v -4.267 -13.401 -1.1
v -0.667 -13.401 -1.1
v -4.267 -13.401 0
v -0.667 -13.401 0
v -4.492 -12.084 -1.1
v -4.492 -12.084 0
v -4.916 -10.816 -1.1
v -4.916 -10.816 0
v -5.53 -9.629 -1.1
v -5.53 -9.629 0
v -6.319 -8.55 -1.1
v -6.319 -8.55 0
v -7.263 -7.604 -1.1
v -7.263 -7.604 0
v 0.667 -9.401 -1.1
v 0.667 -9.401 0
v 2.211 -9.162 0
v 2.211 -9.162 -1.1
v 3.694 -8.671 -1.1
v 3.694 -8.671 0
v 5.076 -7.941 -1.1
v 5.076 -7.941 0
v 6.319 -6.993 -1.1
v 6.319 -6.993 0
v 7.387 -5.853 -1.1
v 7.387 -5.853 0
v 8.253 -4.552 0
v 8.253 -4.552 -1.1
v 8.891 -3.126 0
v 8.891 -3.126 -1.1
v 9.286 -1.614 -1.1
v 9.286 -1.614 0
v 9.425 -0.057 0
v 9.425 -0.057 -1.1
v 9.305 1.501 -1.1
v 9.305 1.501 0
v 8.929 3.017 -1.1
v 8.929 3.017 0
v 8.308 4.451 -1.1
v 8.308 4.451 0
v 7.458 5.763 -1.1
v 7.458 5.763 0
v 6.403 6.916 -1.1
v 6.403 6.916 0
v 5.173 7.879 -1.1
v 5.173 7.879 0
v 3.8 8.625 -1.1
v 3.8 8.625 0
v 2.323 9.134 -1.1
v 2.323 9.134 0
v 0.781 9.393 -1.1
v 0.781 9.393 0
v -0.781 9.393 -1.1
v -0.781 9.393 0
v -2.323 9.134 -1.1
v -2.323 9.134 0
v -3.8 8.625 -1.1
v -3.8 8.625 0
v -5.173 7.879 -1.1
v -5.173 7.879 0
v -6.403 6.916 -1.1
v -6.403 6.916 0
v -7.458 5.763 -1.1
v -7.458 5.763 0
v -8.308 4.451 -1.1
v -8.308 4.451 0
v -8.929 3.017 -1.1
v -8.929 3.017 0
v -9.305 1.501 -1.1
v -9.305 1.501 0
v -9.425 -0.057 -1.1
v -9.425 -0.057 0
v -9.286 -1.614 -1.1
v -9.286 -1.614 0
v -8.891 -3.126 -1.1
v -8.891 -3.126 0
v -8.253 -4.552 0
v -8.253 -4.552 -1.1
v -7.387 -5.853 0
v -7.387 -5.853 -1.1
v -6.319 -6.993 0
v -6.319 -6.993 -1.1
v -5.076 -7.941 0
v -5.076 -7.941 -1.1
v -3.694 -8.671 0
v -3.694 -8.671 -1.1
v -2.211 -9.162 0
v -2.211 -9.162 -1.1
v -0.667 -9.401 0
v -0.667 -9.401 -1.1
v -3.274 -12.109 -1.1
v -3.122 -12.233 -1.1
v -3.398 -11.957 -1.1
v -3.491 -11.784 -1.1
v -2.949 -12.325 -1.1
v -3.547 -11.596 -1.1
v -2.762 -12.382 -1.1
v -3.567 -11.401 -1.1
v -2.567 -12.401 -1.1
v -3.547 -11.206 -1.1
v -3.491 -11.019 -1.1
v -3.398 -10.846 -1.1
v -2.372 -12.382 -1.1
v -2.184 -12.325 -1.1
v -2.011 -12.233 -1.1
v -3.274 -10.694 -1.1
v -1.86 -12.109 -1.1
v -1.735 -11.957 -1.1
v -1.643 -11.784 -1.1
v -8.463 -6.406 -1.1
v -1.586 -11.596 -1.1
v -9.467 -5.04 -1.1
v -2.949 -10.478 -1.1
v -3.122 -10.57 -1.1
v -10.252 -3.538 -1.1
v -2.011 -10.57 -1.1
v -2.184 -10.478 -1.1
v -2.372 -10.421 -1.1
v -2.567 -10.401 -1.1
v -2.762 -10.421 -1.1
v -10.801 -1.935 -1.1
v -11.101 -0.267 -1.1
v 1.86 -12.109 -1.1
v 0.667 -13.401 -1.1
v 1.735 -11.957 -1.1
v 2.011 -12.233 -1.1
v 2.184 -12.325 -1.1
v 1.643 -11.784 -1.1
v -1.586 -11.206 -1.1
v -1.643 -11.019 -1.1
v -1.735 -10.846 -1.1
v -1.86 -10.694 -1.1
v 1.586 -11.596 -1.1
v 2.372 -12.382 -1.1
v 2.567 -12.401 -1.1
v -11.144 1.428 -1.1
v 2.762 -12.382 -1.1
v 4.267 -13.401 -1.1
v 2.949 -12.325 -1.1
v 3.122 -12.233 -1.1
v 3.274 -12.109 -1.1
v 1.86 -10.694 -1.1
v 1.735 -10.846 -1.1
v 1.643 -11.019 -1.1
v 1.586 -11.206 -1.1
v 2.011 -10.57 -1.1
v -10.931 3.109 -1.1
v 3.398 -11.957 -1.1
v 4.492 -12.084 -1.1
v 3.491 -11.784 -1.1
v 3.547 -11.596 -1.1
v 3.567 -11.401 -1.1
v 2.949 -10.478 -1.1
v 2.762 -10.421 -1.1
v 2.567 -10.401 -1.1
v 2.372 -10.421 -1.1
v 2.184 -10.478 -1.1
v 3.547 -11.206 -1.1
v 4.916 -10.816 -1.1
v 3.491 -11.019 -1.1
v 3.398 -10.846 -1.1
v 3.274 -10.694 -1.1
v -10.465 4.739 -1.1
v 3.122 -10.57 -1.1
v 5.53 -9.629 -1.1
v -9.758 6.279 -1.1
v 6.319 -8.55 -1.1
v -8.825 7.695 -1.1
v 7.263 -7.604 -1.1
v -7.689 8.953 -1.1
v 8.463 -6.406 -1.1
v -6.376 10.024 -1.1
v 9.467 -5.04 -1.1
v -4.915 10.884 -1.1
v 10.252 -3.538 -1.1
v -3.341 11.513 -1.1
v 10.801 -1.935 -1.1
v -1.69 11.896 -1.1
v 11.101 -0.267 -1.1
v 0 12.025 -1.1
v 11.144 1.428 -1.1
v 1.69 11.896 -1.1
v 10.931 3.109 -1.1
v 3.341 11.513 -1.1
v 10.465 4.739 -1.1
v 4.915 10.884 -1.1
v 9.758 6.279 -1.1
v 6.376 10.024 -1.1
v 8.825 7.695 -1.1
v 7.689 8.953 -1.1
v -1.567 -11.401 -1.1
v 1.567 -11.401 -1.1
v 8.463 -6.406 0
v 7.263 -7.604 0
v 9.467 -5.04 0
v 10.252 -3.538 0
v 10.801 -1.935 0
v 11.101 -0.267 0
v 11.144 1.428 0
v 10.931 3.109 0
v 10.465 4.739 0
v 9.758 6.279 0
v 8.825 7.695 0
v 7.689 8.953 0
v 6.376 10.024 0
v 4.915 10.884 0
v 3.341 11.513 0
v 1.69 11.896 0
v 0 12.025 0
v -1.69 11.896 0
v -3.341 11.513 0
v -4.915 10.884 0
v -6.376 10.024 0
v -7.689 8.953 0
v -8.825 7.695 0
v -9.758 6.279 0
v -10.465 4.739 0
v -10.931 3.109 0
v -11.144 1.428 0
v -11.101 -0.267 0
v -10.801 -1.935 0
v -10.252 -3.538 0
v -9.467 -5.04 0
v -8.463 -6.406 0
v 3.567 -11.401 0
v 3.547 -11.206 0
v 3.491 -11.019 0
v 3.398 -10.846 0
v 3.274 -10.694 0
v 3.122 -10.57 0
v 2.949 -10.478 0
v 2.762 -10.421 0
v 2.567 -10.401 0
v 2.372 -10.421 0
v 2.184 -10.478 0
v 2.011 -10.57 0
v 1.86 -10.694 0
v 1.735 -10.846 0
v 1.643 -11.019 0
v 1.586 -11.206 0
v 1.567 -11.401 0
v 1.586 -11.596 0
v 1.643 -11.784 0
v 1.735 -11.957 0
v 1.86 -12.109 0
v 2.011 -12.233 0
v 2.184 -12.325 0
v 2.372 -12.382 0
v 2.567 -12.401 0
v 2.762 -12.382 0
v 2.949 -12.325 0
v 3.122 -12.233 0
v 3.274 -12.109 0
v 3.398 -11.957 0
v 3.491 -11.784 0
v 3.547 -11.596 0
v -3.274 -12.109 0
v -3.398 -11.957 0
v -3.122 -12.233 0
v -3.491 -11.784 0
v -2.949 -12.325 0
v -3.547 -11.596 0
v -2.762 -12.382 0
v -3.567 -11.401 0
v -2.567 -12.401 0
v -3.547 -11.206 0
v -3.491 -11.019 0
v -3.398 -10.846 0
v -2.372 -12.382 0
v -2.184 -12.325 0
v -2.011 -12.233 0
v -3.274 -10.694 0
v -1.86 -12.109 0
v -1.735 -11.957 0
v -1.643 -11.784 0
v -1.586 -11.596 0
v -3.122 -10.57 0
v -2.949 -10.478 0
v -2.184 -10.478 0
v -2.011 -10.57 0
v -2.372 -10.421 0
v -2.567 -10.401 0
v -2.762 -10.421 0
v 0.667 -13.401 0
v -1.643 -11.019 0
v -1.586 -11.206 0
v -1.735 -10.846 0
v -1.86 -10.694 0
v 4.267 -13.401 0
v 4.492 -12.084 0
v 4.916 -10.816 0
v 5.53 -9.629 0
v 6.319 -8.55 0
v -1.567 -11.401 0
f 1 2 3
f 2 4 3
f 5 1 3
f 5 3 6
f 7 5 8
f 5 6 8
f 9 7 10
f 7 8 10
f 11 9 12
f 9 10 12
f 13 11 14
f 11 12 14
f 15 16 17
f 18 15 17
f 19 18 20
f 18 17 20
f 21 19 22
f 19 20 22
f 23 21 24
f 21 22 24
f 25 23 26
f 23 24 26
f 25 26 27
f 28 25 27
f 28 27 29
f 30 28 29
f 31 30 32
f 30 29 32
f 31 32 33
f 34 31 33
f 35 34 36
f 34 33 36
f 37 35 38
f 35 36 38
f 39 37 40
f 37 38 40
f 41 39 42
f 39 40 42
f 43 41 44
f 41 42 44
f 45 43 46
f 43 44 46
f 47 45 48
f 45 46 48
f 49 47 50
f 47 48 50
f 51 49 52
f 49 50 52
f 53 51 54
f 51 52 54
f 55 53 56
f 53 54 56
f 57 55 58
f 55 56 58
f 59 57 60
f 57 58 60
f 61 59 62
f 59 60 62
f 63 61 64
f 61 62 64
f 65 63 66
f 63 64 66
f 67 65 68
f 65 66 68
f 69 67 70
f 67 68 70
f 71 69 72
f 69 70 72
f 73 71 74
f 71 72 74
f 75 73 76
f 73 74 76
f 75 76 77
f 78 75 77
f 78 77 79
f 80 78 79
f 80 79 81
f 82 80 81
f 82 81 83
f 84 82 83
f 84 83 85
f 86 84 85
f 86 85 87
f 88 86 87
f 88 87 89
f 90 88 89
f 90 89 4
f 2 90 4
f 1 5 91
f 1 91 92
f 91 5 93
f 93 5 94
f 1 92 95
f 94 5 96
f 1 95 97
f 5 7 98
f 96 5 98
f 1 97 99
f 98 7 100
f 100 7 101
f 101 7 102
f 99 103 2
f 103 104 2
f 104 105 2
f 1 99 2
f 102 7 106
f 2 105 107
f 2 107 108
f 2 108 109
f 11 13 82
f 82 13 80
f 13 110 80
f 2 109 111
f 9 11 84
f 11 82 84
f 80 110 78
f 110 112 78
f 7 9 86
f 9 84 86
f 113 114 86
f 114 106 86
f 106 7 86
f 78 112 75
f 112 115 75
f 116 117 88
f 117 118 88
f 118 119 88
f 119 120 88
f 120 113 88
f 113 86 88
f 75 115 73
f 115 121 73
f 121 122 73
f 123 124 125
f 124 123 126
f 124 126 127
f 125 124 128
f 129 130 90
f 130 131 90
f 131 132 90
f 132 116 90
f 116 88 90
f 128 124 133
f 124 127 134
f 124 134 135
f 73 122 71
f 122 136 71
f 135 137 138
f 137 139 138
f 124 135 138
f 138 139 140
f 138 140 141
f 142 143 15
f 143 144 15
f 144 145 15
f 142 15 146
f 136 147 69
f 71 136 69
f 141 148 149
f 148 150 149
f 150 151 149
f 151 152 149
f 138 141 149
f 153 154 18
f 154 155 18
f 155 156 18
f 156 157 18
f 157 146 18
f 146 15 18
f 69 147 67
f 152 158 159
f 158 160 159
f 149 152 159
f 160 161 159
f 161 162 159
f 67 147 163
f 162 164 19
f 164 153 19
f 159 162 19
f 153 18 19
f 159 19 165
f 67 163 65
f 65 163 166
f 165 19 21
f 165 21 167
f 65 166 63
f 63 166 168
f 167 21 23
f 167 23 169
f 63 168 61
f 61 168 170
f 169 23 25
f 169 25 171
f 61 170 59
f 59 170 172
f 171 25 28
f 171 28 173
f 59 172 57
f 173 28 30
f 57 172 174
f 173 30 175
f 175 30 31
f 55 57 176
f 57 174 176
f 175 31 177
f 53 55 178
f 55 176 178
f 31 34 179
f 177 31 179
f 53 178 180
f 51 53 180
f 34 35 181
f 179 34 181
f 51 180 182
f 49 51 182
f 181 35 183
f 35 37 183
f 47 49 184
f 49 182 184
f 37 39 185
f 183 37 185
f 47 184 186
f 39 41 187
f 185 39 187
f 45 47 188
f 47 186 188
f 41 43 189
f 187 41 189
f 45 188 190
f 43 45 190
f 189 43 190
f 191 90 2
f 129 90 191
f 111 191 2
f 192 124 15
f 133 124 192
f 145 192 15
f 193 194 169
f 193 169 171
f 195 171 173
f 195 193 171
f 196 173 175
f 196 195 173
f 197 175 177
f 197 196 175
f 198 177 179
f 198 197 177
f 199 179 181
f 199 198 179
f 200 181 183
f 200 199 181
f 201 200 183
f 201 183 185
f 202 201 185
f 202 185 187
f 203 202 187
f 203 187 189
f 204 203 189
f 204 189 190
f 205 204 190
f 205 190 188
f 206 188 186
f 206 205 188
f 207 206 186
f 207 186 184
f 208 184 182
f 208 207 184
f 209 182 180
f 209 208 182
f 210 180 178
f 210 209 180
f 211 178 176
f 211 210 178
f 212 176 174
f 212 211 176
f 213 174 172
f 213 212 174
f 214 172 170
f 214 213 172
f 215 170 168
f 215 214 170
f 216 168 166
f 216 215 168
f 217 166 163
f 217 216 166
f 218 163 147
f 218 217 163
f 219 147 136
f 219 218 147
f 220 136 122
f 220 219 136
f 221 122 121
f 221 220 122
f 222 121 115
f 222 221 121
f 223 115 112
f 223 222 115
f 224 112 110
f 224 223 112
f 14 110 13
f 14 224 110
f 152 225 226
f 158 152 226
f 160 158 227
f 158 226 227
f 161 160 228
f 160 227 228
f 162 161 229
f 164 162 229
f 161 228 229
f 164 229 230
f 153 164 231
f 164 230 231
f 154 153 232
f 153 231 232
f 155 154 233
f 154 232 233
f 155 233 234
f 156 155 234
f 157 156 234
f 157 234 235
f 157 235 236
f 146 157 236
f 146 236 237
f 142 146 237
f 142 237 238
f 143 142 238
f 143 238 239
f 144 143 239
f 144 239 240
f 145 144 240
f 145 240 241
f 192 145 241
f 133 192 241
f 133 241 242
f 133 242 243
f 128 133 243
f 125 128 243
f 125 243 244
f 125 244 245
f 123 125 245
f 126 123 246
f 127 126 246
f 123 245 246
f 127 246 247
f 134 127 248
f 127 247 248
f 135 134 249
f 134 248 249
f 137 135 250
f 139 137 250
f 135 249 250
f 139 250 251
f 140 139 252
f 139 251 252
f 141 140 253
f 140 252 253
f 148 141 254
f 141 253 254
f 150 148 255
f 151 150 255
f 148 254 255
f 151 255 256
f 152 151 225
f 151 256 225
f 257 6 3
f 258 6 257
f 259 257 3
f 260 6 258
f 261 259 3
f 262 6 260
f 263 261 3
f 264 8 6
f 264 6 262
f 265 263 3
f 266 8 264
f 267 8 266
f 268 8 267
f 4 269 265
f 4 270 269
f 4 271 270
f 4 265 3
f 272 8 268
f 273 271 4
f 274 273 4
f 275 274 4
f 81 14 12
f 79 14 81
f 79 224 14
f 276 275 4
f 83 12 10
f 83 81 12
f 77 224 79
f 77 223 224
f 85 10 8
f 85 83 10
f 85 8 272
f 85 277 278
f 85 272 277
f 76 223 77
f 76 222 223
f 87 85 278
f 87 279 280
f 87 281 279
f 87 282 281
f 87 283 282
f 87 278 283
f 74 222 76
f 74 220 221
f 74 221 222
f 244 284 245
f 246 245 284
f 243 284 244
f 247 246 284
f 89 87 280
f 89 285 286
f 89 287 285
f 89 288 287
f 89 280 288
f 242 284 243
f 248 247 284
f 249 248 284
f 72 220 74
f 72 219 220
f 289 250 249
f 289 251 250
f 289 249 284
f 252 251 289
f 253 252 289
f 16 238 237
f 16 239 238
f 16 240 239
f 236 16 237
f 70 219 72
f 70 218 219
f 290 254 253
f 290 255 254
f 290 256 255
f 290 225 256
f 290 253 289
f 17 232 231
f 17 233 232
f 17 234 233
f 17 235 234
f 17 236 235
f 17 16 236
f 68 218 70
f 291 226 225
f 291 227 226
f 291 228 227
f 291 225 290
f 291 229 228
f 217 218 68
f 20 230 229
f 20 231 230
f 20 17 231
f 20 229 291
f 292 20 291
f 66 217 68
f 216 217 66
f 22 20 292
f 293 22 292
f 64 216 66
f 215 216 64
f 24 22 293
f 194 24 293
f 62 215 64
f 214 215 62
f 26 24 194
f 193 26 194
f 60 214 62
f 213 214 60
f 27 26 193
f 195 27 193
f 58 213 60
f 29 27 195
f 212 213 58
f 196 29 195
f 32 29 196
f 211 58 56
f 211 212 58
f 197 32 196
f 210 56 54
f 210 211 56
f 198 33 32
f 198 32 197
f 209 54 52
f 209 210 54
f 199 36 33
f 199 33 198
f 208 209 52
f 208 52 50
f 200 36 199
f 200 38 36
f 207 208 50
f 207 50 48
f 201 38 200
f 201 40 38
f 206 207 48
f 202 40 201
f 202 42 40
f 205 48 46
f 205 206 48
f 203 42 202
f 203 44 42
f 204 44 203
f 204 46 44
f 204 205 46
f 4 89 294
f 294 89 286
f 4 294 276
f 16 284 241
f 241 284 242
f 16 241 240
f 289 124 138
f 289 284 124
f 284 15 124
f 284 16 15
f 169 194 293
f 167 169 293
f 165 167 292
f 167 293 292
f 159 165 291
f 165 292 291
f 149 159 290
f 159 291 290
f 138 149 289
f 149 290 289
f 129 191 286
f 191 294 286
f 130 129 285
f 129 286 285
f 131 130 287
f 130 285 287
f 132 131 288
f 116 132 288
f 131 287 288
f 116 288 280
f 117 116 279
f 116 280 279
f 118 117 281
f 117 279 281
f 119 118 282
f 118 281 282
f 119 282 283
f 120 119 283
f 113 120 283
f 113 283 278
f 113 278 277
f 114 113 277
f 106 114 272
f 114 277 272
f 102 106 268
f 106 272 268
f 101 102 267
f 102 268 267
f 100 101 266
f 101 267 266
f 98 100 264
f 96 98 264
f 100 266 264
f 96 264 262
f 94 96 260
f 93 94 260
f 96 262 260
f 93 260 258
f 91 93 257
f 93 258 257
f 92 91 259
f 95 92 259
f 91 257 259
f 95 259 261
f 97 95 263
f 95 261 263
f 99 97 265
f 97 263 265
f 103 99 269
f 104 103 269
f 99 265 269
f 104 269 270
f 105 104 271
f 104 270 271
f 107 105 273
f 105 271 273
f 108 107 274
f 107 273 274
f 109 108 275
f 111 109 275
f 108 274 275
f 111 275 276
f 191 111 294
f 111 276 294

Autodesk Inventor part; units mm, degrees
ref_plane "YZ Plane" through (0, 0, 0) normal (1, 0, 0) x (0, 1, 0)
ref_plane "XZ Plane" through (0, 0, 0) normal (0, 1, 0) x (-1, 0, 0)
ref_plane "XY Plane" through (0, 0, 0) normal (0, 0, 1) x (1, 0, 0)
sketch "草图2" plane through (0, 0, 0) normal (0, 0, 1) x (1, 0, 0)
  line L0 (-0.6667, -13.4014) -> (-4.2667, -13.4014)
  line L1 (-0.6667, -9.4014) -> (-0.6667, -13.4014)
  arc A0 (0.6667, -9.4014) -> (-0.6667, -9.4014) centre (0, 0) ccw
  arc A1 (7.2634, -7.604) -> (-7.2634, -7.604) centre (0, 0.8667) ccw
  line L2 (0, -19.4467) -> (0, 17.2703) projected
  line L3 (0.6667, -13.4014) -> (4.2667, -13.4014)
  line L4 (0.6667, -9.4014) -> (0.6667, -13.4014)
  arc A2 (-4.2667, -13.4014) -> (-7.2634, -7.604) centre (-12.9205, -14.2014) ccw
  arc A3 (7.2634, -7.604) -> (4.2667, -13.4014) centre (12.9205, -14.2014) ccw
  dimension "d15" = 0.8667
  dimension "d28" = 18.85
  dimension "d32" = 2.6
  dimension "d34" = 4
  dimension "d35" = 1.3333
  dimension "d48" = 3.6
  dimension "d49" = 0.8
extrude "拉伸1" add sketch "草图2" against normal blind 1.1
sketch "草图3" plane through (0, 0, 0) normal (0, 0, 1) x (1, 0, 0)
  circle A0 centre (-2.5667, -11.4014) radius 1
  line L0 (-0.6667, -13.4014) -> (-4.2667, -13.4014) projected
  line L1 (0.6667, -13.4014) -> (0.6667, -9.4014) projected
  line L2 (4.2667, -13.4014) -> (0.6667, -13.4014) projected
  line L3 (0, -14.2014) -> (0, -8.6014) projected
  circle A1 centre (2.5667, -11.4014) radius 1
  dimension "d36" = 2
  dimension "d37" = 2
  dimension "d47" = 5.1333
extrude "拉伸2" cut sketch "草图3" against normal through all
equation "\"d15\" = 0.333333 * b"
equation "\"d28\" = g1"
equation "\"d32\" = b"
equation "\"d34\" = ParA"
equation "\"d35\" = 0.333333 * ParA"
equation "\"d48\" = 1.8 * Diam5"
equation "\"d49\" = 0.2 * ParA"
equation "\"d16\" = tt"
equation "\"d36\" = Diam5"
equation "\"d37\" = 0.5 * ParA"
equation "\"d47\" = 0.333333 * ParA + 1.9 * Diam5"
equation "\"g1\" = 18.85"
equation "\"ParA\" = 4"
equation "\"tt\" = 1.1"
equation "\"Diam5\" = 2"
equation "\"TEMPLATE\" = 1.2345"
properties part number "ANSI B 27.7M - 3AMI-20" material "钢，软"
